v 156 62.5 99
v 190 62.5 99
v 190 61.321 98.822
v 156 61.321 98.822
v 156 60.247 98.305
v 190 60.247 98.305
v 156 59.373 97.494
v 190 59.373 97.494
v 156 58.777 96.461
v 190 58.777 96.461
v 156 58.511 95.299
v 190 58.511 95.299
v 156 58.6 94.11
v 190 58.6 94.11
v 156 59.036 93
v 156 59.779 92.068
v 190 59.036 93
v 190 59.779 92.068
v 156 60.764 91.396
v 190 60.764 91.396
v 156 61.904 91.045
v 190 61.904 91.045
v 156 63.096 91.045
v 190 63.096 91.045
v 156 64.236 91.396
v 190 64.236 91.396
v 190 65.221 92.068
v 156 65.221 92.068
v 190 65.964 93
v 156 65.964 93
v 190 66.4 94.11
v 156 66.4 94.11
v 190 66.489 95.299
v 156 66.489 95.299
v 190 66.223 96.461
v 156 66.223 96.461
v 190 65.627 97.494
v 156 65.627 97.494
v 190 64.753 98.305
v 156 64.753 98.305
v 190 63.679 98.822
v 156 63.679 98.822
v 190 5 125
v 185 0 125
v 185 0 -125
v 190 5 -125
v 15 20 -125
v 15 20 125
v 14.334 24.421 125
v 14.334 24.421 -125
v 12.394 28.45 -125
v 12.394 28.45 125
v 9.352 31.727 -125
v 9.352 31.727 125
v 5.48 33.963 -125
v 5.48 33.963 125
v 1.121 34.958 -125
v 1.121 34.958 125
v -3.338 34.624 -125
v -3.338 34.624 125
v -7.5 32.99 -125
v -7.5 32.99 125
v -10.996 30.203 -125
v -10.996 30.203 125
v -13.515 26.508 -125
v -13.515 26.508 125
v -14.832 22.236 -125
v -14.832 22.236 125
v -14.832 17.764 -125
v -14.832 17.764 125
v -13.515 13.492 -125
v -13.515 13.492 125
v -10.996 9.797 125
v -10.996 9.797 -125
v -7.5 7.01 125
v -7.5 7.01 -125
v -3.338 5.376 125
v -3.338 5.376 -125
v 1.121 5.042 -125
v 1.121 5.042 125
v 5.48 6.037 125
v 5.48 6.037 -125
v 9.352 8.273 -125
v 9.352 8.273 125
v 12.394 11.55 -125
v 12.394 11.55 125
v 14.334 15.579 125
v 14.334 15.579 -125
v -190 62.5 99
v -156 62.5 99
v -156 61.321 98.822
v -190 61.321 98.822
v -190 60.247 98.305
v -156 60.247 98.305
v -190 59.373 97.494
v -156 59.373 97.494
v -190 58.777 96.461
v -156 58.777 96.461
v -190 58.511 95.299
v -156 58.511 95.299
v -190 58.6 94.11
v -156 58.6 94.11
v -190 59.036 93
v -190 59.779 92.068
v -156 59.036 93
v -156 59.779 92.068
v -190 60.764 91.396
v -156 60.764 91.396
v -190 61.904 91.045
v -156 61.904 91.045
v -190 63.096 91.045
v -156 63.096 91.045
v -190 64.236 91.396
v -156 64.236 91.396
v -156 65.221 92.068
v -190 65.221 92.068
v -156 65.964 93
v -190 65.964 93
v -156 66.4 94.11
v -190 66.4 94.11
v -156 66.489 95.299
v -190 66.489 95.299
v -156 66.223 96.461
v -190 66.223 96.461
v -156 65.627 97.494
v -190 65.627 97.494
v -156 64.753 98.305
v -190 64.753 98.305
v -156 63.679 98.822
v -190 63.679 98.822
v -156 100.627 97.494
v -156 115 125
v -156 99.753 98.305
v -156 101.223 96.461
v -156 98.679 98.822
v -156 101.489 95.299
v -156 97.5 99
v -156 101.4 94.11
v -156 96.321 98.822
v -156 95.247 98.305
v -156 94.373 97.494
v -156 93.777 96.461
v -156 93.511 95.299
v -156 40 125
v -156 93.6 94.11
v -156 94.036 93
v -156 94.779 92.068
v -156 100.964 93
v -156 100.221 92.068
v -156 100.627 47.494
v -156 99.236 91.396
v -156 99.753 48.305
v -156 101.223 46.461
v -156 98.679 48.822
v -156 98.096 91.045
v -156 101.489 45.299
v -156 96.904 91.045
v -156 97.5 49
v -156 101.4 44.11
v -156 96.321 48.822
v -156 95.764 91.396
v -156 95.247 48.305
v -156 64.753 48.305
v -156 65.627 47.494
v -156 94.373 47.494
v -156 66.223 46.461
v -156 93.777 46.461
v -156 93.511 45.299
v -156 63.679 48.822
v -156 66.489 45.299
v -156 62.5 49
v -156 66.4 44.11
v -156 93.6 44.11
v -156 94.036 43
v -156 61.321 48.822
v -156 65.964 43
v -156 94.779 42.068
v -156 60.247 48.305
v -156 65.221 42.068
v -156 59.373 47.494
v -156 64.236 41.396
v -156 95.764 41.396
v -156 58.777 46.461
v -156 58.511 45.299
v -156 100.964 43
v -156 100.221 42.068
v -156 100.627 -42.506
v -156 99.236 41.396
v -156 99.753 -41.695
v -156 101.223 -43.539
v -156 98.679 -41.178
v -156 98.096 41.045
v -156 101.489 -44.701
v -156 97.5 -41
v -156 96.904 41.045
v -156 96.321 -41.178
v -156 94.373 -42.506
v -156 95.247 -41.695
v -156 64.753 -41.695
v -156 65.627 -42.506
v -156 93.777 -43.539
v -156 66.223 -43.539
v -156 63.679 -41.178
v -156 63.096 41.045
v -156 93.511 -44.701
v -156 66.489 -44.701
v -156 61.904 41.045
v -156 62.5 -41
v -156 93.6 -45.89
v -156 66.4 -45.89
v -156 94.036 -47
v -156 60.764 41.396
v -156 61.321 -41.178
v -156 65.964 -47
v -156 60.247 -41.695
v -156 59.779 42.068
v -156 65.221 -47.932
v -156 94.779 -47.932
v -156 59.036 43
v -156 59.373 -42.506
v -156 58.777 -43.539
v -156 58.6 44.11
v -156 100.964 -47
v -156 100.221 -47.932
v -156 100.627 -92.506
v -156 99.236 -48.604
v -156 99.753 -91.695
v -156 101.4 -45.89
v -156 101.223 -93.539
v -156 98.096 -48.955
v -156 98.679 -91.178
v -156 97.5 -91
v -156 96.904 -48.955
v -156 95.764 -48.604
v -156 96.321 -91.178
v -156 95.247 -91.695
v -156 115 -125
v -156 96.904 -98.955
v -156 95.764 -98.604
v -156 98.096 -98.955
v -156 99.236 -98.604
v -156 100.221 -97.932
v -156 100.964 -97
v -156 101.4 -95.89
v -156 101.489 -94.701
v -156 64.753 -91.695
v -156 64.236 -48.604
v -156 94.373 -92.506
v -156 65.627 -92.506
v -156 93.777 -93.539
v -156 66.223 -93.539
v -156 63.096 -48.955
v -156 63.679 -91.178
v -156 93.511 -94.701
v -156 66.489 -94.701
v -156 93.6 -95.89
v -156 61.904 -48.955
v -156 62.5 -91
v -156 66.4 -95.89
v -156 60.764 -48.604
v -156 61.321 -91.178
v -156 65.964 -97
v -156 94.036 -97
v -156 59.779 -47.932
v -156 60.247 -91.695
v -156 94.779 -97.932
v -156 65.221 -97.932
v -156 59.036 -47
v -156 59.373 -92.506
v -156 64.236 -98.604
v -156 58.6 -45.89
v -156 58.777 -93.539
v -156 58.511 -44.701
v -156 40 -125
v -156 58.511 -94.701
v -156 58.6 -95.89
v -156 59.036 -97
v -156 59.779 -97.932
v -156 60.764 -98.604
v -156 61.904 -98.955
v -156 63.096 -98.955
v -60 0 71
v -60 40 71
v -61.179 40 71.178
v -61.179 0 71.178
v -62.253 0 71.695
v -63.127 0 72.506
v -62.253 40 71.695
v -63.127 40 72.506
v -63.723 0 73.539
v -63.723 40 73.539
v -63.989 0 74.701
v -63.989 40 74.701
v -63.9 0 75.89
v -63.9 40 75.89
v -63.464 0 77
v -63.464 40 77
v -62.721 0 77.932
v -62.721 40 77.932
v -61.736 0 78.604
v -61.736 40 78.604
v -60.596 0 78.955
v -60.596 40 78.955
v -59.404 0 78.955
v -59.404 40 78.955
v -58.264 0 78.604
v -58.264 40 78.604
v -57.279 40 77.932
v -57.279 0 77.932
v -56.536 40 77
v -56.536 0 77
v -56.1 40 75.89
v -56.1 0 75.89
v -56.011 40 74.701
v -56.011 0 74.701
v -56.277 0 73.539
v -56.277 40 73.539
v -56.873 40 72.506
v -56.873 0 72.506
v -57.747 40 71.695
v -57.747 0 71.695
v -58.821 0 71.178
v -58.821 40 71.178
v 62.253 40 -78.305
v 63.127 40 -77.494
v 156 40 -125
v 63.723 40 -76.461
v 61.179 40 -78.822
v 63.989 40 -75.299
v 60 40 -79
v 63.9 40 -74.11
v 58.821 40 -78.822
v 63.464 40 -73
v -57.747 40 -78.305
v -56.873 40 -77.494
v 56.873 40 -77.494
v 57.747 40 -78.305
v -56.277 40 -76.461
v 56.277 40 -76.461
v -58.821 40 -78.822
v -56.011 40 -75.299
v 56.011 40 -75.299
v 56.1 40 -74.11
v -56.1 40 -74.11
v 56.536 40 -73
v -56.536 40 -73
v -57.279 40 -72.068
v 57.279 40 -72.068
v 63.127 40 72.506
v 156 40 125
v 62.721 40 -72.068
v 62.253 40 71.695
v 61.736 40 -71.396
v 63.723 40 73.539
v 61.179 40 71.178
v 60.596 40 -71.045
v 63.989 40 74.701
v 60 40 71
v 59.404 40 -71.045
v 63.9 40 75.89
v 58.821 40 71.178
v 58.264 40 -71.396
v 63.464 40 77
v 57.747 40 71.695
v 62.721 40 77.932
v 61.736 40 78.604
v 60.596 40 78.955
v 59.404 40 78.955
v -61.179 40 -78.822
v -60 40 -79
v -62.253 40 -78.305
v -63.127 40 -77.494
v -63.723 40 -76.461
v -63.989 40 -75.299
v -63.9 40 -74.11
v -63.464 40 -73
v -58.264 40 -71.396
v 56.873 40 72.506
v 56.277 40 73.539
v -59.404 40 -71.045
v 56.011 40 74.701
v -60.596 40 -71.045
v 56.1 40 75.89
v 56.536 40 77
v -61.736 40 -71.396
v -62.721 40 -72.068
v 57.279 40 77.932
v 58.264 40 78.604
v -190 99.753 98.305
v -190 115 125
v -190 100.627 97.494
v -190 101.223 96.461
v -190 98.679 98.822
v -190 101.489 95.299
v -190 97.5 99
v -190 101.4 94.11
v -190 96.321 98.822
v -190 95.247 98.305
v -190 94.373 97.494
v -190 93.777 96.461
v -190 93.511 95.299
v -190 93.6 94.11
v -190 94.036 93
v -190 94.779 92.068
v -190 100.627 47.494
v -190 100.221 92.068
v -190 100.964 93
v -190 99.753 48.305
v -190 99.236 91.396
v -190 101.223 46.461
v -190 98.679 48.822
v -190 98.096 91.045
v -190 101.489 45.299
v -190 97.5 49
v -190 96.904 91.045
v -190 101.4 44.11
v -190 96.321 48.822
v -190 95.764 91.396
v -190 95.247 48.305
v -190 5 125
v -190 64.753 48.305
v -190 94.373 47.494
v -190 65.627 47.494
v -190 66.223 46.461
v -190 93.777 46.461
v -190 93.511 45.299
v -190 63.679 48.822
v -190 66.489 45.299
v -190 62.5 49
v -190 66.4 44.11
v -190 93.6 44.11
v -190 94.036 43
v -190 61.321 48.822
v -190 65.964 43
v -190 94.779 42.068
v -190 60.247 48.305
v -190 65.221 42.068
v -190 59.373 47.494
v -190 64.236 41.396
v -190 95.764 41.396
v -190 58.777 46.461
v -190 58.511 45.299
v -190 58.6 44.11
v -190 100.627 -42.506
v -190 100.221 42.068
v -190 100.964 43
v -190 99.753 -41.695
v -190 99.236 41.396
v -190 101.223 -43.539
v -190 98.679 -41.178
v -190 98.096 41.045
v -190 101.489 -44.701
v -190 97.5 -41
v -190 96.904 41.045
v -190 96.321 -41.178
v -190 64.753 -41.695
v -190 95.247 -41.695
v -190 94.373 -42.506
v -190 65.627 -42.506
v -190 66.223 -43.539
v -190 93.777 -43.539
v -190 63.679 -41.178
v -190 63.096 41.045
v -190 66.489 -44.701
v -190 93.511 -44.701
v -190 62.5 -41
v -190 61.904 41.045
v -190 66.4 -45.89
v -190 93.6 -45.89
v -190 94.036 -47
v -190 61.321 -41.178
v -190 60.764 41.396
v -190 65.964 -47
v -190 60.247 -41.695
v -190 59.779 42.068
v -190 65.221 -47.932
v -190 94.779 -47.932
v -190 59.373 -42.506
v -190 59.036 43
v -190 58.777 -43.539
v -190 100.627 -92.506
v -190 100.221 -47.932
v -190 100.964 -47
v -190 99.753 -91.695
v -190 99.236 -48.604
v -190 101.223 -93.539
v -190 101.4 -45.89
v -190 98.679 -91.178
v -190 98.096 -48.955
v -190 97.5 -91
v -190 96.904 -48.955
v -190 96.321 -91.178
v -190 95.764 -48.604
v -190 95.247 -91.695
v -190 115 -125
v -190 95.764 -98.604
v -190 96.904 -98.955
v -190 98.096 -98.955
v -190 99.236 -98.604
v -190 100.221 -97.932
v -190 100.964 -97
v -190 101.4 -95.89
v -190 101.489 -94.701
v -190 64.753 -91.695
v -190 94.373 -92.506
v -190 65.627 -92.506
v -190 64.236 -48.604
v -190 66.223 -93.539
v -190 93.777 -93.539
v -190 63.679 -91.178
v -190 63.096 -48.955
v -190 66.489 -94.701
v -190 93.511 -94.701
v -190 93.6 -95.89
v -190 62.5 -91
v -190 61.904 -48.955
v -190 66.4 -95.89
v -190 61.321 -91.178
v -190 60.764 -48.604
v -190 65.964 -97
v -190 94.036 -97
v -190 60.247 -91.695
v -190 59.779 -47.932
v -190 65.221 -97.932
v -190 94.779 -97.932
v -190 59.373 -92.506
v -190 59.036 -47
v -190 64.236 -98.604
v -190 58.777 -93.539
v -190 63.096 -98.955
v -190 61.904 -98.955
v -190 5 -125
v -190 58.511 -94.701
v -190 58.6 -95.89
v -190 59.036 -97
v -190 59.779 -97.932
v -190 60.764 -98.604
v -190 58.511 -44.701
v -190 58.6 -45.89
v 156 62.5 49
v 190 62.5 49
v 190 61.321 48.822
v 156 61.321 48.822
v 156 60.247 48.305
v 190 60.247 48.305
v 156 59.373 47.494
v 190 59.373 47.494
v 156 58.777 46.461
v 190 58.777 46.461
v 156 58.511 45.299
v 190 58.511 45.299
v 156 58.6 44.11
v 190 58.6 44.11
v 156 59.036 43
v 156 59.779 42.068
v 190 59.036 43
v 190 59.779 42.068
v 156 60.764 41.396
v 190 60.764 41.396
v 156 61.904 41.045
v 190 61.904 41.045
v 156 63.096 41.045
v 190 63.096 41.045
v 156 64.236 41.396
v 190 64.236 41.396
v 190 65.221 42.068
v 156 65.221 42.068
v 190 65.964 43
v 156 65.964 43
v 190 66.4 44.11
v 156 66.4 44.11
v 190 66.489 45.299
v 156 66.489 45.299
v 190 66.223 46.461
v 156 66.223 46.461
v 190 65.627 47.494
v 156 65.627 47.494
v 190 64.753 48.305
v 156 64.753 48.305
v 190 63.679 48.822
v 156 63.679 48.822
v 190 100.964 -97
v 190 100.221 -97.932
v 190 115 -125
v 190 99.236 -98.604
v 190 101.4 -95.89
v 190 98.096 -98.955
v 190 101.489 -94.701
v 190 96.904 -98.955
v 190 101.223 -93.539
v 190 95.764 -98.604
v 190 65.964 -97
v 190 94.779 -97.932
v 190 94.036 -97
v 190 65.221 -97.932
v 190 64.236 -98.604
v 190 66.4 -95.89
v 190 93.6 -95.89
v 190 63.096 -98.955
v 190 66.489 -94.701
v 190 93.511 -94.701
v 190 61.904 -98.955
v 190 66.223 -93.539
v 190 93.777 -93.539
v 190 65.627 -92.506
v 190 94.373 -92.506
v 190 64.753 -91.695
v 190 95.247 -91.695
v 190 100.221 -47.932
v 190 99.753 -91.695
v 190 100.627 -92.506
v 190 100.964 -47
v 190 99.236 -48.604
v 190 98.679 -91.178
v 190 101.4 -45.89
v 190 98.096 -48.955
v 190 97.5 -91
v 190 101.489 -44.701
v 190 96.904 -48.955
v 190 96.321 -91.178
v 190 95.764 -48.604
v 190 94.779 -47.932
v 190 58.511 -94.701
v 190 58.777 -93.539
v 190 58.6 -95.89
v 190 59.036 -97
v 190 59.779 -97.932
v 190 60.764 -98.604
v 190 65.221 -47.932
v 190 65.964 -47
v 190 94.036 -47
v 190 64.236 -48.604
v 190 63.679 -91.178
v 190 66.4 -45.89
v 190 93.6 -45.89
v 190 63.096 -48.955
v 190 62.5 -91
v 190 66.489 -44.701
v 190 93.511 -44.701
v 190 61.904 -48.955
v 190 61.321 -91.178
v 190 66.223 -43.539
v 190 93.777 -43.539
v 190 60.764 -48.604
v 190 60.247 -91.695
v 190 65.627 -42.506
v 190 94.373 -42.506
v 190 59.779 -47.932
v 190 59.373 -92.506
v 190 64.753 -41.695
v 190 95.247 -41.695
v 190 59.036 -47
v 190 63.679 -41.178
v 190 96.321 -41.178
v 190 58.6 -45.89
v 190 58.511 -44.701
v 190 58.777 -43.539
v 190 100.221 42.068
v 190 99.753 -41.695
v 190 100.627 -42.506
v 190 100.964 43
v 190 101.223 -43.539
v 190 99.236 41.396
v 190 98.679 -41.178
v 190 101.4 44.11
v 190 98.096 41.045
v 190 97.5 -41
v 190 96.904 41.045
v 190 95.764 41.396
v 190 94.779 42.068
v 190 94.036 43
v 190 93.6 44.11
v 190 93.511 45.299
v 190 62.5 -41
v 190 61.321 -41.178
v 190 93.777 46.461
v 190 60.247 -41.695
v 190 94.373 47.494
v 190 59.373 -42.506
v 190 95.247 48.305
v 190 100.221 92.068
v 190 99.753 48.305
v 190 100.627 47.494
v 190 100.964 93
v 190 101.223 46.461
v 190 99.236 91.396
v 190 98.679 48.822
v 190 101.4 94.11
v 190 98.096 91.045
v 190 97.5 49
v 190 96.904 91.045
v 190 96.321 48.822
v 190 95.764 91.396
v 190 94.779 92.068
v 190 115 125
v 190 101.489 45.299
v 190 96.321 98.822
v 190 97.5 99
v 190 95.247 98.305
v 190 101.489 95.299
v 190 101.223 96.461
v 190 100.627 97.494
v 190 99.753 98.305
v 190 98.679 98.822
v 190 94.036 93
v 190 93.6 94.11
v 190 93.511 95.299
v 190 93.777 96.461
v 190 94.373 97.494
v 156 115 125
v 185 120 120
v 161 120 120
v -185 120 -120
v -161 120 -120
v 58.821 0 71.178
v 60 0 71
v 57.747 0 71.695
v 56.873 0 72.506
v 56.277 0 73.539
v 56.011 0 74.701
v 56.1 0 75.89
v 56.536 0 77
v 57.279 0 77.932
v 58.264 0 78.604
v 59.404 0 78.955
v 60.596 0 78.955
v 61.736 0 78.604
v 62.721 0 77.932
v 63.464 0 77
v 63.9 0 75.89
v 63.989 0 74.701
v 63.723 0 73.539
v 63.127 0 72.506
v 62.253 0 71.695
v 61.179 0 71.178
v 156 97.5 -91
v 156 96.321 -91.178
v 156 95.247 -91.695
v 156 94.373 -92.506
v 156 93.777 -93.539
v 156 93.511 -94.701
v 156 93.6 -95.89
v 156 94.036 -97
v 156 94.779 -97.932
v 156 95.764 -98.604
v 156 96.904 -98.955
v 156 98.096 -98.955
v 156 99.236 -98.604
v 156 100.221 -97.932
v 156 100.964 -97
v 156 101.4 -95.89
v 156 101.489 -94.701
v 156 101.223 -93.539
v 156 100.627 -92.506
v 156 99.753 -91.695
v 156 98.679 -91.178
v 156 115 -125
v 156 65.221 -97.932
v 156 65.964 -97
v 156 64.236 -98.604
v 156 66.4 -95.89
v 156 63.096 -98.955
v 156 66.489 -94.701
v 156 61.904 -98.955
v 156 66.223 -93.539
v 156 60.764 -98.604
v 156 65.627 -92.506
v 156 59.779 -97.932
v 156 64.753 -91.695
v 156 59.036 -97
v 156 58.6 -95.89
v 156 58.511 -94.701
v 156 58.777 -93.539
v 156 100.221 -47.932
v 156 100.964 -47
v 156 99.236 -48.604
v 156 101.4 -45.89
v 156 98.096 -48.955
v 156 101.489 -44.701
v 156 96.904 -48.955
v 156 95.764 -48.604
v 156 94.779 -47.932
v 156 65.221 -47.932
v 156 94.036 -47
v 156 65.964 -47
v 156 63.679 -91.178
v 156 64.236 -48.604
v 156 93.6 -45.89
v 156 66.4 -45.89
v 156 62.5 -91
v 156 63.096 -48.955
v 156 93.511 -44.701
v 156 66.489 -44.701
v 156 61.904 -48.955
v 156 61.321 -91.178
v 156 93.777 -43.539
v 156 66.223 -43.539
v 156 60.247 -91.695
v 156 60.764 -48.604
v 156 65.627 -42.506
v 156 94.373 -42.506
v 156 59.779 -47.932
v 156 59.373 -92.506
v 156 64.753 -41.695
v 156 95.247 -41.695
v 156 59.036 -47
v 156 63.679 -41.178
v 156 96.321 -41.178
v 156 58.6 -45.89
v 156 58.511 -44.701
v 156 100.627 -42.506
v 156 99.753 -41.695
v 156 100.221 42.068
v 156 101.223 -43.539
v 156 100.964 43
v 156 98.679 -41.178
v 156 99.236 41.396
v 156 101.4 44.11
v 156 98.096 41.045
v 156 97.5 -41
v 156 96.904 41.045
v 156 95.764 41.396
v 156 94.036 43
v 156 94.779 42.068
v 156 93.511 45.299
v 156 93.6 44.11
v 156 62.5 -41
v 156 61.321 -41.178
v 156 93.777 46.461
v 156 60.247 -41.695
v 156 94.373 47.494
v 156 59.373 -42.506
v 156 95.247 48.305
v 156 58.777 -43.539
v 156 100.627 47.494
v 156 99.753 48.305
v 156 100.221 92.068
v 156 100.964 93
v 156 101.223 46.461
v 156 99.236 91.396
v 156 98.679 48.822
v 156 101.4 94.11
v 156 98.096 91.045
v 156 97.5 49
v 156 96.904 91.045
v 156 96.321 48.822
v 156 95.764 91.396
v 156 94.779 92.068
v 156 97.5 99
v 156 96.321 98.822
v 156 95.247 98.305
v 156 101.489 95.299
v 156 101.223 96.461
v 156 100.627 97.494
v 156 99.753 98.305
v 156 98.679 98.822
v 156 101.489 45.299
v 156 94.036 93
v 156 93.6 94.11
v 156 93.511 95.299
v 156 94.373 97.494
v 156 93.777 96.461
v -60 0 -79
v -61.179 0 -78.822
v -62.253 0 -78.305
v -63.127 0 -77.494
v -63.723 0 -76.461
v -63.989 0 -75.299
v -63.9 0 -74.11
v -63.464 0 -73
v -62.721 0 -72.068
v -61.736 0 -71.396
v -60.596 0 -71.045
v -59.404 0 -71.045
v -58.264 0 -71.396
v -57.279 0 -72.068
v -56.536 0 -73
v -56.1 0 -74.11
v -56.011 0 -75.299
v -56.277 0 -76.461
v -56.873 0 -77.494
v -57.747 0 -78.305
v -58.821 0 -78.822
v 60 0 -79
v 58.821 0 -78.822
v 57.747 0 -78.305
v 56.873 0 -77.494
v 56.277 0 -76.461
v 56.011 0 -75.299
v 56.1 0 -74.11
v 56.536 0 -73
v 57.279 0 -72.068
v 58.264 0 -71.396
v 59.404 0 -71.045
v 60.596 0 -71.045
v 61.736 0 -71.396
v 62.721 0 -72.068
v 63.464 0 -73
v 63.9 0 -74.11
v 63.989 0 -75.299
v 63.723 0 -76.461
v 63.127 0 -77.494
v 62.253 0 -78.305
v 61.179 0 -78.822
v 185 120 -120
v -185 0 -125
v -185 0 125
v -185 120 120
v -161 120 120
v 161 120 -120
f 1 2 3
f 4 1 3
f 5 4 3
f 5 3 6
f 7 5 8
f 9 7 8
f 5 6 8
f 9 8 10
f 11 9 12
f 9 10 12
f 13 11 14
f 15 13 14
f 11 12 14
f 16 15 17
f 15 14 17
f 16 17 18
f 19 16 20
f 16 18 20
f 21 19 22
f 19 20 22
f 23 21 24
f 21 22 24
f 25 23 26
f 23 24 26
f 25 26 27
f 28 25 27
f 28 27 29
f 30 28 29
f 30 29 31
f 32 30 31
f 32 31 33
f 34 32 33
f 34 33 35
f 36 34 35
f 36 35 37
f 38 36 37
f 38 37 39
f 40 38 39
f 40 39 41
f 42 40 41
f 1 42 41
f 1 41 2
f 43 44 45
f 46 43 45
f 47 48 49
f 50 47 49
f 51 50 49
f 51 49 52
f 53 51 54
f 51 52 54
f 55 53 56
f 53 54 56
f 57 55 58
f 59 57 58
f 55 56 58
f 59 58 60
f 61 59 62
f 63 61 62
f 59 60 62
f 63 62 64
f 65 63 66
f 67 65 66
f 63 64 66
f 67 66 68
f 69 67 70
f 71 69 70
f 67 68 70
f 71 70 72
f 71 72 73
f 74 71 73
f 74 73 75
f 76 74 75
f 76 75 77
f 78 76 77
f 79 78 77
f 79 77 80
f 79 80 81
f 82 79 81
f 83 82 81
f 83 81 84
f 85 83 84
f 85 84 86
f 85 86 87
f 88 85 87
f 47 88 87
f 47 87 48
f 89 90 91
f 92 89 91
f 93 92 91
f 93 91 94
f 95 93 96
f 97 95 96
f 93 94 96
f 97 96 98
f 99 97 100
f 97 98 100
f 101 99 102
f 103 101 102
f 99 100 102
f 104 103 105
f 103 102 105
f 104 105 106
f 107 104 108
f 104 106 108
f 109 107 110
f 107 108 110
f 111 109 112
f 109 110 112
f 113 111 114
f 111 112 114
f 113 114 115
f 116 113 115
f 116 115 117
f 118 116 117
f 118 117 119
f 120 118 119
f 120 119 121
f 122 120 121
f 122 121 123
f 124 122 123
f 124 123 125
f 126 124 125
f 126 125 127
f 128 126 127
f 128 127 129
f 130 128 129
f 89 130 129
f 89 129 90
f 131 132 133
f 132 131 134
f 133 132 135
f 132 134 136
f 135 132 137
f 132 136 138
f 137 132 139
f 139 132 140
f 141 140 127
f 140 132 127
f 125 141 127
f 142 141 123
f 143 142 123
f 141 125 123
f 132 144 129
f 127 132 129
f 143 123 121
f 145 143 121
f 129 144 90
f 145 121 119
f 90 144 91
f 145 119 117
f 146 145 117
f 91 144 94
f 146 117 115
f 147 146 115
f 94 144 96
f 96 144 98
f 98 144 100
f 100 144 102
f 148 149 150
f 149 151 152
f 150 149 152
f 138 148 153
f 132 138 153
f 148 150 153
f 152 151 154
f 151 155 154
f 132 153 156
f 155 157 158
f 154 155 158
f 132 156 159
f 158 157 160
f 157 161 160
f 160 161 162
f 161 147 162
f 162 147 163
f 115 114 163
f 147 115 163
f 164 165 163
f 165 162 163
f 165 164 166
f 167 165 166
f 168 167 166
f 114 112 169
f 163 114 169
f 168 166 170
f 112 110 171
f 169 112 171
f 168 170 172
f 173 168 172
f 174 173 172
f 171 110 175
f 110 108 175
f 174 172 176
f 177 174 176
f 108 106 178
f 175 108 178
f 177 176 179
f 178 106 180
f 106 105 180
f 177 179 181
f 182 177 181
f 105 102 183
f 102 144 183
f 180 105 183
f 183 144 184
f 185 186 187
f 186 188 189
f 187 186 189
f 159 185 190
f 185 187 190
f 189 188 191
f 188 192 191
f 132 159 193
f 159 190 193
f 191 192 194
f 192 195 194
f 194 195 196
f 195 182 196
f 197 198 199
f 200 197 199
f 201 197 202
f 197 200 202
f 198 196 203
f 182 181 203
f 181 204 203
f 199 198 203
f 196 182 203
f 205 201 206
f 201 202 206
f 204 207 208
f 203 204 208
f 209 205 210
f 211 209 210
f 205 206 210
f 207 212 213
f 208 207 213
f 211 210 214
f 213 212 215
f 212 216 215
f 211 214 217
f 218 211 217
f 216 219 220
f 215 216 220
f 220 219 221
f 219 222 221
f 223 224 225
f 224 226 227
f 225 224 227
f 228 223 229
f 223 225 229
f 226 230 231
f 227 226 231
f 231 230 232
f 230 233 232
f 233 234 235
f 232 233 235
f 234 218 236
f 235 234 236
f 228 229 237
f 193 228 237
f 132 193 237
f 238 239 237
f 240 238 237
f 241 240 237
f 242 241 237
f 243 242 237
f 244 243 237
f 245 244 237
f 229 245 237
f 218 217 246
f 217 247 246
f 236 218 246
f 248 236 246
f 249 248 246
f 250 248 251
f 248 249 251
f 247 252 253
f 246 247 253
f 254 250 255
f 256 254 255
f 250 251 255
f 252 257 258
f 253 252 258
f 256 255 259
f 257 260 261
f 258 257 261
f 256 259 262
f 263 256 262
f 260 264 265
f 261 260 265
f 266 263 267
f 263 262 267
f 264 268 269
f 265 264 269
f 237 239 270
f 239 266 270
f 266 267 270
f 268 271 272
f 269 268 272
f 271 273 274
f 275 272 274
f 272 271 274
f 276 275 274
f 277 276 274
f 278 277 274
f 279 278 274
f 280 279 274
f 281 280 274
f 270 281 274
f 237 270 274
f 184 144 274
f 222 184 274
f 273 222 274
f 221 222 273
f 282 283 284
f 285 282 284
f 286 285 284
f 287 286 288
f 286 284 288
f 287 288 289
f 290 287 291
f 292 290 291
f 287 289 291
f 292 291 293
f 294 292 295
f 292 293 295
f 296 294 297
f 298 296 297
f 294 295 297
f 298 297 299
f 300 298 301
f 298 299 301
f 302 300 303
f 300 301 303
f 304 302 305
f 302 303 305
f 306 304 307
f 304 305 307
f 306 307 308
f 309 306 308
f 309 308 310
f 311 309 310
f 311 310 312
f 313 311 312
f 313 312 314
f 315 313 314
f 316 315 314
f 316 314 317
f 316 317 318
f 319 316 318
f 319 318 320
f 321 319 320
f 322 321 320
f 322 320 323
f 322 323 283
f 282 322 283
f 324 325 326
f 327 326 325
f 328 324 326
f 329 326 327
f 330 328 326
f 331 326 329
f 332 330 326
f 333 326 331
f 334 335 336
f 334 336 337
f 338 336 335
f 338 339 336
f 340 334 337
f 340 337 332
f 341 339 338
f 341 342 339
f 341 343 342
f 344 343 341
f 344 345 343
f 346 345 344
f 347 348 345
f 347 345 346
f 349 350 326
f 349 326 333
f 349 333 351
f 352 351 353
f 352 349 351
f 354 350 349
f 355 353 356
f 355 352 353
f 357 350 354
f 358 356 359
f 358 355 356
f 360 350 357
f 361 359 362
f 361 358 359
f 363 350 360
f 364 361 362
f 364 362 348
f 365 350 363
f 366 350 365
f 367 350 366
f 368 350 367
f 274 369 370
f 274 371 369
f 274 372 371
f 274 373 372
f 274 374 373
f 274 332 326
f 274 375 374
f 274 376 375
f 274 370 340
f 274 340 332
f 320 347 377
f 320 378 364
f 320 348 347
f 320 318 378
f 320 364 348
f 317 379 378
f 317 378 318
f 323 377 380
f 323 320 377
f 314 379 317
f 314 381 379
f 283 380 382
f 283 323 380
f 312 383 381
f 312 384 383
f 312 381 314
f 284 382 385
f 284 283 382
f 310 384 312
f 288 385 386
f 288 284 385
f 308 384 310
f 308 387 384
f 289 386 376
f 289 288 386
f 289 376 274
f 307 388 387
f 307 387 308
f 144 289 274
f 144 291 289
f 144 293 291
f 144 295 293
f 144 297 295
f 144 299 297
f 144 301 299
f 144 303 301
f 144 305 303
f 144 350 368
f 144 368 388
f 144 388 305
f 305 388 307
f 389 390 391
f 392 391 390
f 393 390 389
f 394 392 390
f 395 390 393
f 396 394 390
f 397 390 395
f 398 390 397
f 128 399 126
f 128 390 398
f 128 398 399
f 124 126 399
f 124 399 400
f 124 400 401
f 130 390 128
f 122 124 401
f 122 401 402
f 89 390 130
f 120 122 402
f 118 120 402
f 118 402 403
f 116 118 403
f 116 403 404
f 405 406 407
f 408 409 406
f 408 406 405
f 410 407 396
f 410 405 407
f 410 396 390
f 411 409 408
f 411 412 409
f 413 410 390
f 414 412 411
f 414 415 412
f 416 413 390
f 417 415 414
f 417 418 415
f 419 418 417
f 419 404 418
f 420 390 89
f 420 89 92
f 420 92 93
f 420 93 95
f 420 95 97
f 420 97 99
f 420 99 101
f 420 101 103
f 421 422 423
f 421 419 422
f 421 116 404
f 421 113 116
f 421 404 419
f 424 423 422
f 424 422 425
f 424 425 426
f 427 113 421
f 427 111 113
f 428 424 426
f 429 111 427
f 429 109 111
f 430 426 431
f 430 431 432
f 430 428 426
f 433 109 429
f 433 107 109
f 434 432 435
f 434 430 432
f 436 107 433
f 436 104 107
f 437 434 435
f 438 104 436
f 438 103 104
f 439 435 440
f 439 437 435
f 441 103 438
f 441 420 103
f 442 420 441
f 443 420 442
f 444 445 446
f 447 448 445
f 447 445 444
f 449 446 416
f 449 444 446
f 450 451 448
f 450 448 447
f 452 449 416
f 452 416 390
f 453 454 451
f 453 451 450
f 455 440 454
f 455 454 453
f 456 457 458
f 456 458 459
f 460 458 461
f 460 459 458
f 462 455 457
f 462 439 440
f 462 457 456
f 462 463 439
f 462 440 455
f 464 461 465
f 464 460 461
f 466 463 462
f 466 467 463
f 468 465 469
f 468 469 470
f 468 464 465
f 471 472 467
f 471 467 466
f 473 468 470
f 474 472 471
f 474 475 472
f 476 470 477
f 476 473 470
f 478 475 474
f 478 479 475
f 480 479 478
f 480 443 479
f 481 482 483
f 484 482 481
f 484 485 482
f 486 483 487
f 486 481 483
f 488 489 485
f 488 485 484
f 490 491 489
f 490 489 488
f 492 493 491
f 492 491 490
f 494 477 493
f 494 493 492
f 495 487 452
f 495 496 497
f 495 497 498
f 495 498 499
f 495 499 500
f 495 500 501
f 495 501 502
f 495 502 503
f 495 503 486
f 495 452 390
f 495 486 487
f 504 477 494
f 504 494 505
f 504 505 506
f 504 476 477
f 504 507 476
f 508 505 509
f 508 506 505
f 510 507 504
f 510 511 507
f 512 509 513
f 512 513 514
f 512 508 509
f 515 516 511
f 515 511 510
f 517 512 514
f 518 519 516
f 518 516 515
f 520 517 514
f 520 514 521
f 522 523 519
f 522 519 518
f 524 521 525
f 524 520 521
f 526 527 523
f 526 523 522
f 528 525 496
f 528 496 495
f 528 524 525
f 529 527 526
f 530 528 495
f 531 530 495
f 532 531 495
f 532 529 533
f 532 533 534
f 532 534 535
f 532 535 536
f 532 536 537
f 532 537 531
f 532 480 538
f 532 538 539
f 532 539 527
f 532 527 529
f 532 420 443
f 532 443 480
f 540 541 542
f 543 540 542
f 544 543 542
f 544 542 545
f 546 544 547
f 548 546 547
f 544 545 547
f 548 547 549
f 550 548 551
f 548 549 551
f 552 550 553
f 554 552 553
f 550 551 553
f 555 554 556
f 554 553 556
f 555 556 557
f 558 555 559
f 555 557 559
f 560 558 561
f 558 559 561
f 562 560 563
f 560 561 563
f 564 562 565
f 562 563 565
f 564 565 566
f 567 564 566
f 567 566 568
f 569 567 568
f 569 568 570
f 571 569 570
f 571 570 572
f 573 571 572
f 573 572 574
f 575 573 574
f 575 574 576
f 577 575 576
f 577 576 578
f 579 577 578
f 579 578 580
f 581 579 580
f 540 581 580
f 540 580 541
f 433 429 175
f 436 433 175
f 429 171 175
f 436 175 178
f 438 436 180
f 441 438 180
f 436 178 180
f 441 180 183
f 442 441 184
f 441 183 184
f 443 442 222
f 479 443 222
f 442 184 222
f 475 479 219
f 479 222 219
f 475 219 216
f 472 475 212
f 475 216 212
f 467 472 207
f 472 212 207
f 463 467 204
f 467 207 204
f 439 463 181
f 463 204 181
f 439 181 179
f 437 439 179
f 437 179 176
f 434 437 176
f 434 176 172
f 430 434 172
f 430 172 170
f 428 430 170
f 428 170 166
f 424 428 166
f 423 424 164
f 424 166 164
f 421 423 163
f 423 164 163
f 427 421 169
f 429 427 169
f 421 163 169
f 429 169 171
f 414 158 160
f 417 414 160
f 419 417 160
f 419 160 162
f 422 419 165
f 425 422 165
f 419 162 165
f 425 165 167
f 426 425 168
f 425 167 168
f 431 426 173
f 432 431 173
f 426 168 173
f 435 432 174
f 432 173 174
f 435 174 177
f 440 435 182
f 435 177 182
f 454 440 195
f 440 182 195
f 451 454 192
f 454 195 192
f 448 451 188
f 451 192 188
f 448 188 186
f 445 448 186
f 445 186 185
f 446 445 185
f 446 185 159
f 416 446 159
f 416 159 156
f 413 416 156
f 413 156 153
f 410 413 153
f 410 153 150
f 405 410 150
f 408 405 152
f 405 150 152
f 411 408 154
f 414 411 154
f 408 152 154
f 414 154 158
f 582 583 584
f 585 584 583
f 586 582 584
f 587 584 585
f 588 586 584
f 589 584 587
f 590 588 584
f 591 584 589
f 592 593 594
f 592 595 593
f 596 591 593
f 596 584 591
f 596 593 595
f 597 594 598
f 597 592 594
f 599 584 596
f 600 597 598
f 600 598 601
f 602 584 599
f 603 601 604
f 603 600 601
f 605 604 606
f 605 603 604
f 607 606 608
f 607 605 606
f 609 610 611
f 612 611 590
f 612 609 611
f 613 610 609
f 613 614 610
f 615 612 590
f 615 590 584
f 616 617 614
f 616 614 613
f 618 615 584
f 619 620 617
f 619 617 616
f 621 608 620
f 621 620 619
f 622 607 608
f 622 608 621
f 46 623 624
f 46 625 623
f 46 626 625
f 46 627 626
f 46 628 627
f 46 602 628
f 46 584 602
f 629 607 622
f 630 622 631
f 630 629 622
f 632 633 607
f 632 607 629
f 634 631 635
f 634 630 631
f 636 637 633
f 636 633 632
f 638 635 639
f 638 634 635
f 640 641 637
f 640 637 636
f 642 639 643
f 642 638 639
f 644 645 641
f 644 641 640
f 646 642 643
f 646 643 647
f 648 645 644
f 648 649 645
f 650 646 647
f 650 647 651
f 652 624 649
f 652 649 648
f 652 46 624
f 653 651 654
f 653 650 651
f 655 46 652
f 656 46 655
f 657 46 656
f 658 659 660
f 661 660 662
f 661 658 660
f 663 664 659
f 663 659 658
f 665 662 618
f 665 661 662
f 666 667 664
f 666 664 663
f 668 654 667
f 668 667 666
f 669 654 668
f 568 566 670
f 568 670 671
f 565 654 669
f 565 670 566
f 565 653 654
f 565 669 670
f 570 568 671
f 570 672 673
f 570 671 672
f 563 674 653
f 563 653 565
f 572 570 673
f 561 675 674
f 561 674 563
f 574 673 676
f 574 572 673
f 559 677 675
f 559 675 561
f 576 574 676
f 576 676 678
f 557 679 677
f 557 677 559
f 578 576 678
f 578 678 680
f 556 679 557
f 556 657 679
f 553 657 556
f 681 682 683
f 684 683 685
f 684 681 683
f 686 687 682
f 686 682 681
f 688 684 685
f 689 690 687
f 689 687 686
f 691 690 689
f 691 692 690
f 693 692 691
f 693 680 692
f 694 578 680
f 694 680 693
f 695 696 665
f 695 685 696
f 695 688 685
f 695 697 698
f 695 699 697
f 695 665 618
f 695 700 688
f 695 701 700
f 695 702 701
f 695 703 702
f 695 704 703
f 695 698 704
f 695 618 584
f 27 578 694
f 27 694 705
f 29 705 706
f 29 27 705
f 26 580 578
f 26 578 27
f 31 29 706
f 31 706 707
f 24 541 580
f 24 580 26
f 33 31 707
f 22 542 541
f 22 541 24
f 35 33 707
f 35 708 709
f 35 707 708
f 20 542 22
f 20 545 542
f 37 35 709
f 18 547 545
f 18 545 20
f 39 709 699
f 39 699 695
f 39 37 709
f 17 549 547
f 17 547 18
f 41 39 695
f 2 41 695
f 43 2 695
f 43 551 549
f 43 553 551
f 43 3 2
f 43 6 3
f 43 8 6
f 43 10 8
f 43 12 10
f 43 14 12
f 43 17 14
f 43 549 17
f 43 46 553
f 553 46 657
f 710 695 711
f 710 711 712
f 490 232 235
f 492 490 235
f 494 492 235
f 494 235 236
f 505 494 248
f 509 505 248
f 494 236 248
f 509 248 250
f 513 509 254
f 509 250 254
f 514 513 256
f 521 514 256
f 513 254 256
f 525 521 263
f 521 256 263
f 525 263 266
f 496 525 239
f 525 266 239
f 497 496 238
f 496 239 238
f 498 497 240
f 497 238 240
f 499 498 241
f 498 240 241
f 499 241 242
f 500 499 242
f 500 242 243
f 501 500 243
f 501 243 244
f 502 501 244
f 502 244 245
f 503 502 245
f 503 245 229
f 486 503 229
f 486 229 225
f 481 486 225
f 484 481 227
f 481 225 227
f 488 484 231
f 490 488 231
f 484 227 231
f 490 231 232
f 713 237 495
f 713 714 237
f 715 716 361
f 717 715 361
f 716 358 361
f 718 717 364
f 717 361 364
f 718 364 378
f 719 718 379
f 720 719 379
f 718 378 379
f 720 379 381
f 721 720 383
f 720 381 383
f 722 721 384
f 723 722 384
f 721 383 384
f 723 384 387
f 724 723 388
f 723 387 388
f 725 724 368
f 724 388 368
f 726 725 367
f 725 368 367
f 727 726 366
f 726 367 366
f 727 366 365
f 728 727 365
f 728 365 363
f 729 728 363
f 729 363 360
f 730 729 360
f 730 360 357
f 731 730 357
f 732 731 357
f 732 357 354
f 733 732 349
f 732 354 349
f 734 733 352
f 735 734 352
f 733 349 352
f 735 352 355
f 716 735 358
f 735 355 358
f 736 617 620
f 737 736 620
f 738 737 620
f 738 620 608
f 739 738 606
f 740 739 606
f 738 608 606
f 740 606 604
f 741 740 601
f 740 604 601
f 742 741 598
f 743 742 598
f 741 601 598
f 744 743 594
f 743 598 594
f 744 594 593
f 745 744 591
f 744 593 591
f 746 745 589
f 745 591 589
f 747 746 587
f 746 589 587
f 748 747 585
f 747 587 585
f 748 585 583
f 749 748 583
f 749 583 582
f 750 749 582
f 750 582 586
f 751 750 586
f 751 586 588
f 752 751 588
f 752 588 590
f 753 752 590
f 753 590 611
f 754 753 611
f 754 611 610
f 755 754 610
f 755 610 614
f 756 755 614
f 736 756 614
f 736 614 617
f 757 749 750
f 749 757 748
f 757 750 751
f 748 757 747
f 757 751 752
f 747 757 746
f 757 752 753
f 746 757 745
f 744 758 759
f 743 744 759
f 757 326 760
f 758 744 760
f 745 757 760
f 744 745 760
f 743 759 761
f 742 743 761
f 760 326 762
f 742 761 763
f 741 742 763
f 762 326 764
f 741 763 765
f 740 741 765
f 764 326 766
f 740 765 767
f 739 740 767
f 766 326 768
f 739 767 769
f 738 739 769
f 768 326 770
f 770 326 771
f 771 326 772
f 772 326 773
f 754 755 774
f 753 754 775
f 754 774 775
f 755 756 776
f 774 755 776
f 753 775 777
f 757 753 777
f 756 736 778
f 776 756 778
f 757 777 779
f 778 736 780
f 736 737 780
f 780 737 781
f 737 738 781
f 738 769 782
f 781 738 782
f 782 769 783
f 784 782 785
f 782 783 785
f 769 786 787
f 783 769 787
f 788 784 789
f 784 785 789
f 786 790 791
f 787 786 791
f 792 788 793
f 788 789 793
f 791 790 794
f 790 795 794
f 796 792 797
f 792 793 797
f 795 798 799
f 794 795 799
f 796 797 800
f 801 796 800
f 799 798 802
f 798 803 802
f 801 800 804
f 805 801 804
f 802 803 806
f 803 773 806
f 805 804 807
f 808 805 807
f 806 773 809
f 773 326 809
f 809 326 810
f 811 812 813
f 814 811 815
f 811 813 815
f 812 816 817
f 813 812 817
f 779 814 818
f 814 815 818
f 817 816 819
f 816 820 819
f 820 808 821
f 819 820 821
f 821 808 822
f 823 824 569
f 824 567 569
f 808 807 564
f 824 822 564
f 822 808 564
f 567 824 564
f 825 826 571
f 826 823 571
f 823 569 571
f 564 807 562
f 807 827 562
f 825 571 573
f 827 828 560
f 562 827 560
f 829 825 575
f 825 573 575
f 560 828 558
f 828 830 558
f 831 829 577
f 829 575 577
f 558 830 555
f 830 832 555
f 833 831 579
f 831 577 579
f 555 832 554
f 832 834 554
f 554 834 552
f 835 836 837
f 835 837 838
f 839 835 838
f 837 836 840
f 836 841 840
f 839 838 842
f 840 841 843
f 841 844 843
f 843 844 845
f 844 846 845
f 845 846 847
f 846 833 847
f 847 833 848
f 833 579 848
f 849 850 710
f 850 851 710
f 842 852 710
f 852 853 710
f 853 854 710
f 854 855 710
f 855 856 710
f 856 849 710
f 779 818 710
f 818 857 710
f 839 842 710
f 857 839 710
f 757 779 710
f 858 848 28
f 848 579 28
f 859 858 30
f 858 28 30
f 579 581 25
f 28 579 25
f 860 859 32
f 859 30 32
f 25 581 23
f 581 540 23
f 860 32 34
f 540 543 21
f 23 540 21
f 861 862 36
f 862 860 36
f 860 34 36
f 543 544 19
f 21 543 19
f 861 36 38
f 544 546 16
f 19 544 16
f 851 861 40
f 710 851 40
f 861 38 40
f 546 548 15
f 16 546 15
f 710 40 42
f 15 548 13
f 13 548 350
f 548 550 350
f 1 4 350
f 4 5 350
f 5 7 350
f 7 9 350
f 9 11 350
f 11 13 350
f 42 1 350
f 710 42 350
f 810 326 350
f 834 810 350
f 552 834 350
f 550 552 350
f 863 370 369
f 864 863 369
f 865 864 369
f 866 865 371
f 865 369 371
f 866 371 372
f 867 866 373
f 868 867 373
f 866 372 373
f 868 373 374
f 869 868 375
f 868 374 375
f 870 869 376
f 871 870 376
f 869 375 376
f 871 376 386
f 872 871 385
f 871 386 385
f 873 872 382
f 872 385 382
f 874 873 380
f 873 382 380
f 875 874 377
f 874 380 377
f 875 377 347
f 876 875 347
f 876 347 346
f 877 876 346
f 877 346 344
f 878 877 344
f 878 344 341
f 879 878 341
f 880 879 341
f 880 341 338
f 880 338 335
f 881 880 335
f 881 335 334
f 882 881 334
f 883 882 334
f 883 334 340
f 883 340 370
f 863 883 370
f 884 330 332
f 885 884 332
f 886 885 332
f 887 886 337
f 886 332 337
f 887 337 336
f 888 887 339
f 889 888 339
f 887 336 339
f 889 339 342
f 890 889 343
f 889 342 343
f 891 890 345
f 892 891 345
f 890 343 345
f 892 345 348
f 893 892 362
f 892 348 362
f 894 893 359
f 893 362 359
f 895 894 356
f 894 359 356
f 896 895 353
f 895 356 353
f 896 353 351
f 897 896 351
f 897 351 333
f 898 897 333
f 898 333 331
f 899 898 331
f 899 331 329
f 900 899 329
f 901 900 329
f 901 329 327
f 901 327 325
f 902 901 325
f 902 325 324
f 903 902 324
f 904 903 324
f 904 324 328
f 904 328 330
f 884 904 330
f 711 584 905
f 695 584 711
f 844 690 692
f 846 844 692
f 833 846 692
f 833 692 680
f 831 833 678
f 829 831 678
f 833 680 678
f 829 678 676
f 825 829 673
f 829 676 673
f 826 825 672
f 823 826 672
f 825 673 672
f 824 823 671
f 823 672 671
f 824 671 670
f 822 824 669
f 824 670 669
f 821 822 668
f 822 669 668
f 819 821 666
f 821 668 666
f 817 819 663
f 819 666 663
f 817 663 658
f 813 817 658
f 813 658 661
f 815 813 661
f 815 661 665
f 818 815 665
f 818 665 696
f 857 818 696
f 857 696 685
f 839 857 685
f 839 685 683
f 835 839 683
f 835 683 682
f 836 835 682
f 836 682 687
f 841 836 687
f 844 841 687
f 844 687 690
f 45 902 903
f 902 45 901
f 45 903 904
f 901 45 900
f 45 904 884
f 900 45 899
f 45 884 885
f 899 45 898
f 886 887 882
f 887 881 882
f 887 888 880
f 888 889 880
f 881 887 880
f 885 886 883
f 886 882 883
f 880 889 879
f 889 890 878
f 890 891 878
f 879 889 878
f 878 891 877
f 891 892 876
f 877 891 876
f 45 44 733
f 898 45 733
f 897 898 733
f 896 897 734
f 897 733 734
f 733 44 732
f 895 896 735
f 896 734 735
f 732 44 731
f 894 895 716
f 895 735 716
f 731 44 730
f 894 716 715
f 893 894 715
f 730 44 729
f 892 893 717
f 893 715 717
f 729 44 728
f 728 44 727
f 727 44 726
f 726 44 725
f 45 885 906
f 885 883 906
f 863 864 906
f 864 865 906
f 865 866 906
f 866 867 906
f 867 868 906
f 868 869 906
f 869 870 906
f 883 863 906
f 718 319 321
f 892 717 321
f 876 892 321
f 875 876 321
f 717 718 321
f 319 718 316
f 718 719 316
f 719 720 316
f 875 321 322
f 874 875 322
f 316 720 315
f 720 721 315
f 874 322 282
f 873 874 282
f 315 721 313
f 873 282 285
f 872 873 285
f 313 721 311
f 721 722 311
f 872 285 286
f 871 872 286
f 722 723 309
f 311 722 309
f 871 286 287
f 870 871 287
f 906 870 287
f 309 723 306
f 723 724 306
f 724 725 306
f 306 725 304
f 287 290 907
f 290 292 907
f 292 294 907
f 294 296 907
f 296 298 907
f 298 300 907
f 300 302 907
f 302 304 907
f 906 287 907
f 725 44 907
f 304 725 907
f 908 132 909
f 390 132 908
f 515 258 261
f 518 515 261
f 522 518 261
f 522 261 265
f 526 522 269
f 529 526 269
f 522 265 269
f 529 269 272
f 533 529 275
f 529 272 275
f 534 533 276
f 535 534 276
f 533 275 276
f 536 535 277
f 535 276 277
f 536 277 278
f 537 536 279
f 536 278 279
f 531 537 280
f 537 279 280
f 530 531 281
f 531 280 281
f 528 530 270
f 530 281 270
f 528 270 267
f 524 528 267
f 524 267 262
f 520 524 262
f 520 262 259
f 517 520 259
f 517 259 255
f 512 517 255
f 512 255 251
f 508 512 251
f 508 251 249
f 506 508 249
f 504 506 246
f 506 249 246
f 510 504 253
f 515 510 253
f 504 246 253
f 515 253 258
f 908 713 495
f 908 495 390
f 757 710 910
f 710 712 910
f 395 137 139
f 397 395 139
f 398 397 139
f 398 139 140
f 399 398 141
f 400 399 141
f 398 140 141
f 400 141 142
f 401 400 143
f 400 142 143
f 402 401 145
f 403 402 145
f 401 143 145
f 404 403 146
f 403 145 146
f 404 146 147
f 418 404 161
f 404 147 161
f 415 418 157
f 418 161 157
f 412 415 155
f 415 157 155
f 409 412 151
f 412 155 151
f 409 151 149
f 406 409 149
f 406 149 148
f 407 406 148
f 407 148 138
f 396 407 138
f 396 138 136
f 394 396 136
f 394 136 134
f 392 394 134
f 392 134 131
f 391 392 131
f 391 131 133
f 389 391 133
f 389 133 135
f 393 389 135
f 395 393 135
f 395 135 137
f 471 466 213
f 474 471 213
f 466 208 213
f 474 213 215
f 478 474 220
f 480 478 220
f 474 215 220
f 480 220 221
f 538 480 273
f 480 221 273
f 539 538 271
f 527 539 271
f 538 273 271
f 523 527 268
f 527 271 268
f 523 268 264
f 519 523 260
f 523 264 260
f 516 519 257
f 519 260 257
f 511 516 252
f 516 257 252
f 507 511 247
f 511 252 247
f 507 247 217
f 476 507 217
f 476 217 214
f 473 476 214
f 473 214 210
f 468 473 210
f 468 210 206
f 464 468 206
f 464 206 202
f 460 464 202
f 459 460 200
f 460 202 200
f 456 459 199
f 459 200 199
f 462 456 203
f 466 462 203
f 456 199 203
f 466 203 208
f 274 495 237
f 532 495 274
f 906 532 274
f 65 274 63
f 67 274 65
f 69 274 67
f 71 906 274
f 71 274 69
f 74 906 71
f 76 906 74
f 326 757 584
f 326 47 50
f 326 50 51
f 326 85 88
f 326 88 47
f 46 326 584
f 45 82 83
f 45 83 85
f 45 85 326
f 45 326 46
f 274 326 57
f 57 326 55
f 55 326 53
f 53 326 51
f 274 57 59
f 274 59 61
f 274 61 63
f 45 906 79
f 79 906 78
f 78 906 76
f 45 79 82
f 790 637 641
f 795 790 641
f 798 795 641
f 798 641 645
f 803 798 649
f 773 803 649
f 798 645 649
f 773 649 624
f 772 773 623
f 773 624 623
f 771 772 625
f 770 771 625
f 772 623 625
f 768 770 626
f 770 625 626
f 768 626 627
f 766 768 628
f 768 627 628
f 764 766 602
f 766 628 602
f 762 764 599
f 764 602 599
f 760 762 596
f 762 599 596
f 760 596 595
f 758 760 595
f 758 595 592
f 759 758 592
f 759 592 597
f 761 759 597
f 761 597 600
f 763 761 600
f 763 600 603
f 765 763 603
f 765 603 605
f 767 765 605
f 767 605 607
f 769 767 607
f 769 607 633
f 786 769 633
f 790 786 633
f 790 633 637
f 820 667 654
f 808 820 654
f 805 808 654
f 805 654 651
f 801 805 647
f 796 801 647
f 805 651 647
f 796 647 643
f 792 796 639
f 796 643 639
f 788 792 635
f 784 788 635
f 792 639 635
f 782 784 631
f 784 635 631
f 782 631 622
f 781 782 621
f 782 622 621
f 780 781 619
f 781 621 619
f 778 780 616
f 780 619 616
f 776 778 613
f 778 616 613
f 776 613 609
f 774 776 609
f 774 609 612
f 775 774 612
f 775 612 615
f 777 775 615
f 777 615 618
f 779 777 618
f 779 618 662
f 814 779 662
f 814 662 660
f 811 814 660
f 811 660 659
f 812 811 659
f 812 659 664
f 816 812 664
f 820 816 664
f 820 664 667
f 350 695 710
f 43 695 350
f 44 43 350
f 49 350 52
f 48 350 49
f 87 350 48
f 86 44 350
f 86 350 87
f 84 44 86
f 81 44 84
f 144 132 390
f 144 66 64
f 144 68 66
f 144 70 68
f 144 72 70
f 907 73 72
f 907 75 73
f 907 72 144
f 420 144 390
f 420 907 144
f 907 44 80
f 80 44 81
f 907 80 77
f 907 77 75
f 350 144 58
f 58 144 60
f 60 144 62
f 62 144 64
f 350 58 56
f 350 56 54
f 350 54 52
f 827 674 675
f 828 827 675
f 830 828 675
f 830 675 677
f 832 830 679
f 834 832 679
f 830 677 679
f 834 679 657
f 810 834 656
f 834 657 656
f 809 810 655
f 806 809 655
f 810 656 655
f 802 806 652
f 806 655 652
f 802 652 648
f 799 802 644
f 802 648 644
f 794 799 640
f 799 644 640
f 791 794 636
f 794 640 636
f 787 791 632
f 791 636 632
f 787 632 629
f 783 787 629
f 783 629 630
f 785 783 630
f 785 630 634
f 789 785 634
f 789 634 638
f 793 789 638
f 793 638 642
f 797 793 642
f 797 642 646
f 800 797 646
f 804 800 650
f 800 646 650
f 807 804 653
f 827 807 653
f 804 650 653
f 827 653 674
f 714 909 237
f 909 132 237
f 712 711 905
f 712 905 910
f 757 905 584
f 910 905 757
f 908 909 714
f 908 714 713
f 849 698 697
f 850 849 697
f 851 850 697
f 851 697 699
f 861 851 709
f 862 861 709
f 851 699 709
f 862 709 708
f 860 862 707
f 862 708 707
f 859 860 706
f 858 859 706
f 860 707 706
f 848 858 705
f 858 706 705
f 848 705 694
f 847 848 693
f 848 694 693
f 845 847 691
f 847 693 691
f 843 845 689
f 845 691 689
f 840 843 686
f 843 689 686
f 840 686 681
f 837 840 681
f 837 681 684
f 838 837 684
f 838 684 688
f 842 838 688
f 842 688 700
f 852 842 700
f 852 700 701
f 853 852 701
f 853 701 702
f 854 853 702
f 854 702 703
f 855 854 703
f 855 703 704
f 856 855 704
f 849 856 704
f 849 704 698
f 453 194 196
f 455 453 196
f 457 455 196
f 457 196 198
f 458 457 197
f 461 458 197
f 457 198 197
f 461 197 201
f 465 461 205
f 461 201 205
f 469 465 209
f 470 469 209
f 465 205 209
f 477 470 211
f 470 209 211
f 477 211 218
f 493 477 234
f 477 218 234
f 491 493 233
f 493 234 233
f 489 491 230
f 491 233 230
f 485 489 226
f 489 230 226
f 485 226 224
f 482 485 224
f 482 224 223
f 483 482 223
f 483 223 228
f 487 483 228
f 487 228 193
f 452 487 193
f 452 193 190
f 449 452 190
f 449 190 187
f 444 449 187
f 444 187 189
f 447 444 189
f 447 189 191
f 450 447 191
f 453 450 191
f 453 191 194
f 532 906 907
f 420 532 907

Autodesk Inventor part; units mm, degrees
ref_plane "YZ Plane" through (0, 0, 0) normal (1, 0, 0) x (0, 1, 0)
ref_plane "XZ Plane" through (0, 0, 0) normal (0, 1, 0) x (-1, 0, 0)
ref_plane "XY Plane" through (0, 0, 0) normal (0, 0, 1) x (1, 0, 0)
sketch "Sketch1" plane through (0, 0, 0) normal (0, 1, 0) x (-1, 0, 0)
  line L0 (190, -125) -> (-190, -125)
  line L1 (-190, -125) -> (-190, 125)
  line L2 (-190, 125) -> (190, 125)
  line L3 (190, 125) -> (190, -125)
  line L4 (190, -125) -> (-190, 125) construction
  line L5 (-190, -125) -> (190, 125) construction
  line L6 (-60, 75) -> (60, 75) construction
  line L7 (60, 75) -> (60, -75) construction
  line L8 (60, -75) -> (-60, -75) construction
  line L9 (-60, -75) -> (-60, 75) construction
  line L10 (-60, 75) -> (60, -75) construction
  line L11 (60, 75) -> (-60, -75) construction
  line L12 (-156, 125) -> (156, 125)
  line L13 (156, 125) -> (156, -125)
  line L14 (156, -125) -> (-156, -125)
  line L15 (-156, -125) -> (-156, 125)
  line L16 (-156, 125) -> (156, -125) construction
  line L17 (156, 125) -> (-156, -125) construction
  point P0 (0, 0)
  dimension "d0" = 380
  dimension "d1" = 250
  dimension "d2" = 120
  dimension "d3" = 150
  dimension "d16" = 312
extrude "Extrusion1" add sketch "Sketch1" along normal blind 40
hole "Hole1" at (-60, 0, -75) at (60, 0, -75) at (60, 0, 75) at (-60, 0, 75) direction (0, 1, 0) diameter 8 end through all
sketch "Sketch2" plane through (-190, 0, 125) normal (0, 0, 1) x (1, 0, 0)
  line L0 (0, 0) -> (380, 0) construction
  line L1 (0, 40) -> (380, 40) construction
  line L2 (380, 0) -> (0, 40) construction
  line L3 (0, 0) -> (380, 40) construction
  circle A0 centre (190, 20) radius 15
  point P0 (190, 0)
  dimension "d13" = 30
extrude "Extrusion2" cut sketch "Sketch2" against normal through all
extrude "Extrusion3" add sketch "Sketch1" along normal blind 120 contours L0 L13 L2 L3 | L0 L1 L2 L15
sketch "Sketch3" plane through (-190, 0, -125) normal (-1, 0, 0) x (0, 0, 1)
  line L0 (170, 97.5) -> (220, 97.5) construction
  line L1 (220, 97.5) -> (220, 62.5) construction
  line L2 (220, 62.5) -> (170, 62.5) construction
  line L3 (170, 62.5) -> (170, 97.5) construction
  line L4 (170, 97.5) -> (220, 62.5) construction
  line L5 (220, 97.5) -> (170, 62.5) construction
  line L6 (0, 0) -> (250, 0) construction
  line L7 (125, 0) -> (125, 120) construction
  line L8 (0, 120) -> (250, 120) construction
  line L9 (80, 97.5) -> (30, 97.5) construction
  line L10 (30, 97.5) -> (30, 62.5) construction
  line L11 (30, 62.5) -> (80, 62.5) construction
  line L12 (80, 62.5) -> (80, 97.5) construction
  line L13 (80, 97.5) -> (30, 62.5) construction
  line L14 (30, 97.5) -> (80, 62.5) construction
  point P0 (195, 80)
  point P1 (55, 80)
  dimension "d19" = 50
  dimension "d20" = 35
  dimension "d21" = 62.5
  dimension "d22" = 70
hole "Hole2" at (-190, 97.5, 45) at (-190, 97.5, 95) at (-190, 62.5, 95) at (-190, 62.5, 45) at (-190, 62.5, -45) at (-190, 62.5, -95) at (-190, 97.5, -95) at (-190, 97.5, -45) direction (1, 0, 0) diameter 8 end through all
chamfer "Chamfer1" distance 5 angle 45 10 edges at (-190, 120, 0) (-173, 120, 125) (-156, 120, 0) (-173, 120, -125) (156, 120, 0) (190, 120, 0) (173, 120, -125) (173, 120, 125) (-190, 0, 0) (190, 0, 0)
properties part number "SACMI DPA TILES GRIP FIXED SUPPORT"
